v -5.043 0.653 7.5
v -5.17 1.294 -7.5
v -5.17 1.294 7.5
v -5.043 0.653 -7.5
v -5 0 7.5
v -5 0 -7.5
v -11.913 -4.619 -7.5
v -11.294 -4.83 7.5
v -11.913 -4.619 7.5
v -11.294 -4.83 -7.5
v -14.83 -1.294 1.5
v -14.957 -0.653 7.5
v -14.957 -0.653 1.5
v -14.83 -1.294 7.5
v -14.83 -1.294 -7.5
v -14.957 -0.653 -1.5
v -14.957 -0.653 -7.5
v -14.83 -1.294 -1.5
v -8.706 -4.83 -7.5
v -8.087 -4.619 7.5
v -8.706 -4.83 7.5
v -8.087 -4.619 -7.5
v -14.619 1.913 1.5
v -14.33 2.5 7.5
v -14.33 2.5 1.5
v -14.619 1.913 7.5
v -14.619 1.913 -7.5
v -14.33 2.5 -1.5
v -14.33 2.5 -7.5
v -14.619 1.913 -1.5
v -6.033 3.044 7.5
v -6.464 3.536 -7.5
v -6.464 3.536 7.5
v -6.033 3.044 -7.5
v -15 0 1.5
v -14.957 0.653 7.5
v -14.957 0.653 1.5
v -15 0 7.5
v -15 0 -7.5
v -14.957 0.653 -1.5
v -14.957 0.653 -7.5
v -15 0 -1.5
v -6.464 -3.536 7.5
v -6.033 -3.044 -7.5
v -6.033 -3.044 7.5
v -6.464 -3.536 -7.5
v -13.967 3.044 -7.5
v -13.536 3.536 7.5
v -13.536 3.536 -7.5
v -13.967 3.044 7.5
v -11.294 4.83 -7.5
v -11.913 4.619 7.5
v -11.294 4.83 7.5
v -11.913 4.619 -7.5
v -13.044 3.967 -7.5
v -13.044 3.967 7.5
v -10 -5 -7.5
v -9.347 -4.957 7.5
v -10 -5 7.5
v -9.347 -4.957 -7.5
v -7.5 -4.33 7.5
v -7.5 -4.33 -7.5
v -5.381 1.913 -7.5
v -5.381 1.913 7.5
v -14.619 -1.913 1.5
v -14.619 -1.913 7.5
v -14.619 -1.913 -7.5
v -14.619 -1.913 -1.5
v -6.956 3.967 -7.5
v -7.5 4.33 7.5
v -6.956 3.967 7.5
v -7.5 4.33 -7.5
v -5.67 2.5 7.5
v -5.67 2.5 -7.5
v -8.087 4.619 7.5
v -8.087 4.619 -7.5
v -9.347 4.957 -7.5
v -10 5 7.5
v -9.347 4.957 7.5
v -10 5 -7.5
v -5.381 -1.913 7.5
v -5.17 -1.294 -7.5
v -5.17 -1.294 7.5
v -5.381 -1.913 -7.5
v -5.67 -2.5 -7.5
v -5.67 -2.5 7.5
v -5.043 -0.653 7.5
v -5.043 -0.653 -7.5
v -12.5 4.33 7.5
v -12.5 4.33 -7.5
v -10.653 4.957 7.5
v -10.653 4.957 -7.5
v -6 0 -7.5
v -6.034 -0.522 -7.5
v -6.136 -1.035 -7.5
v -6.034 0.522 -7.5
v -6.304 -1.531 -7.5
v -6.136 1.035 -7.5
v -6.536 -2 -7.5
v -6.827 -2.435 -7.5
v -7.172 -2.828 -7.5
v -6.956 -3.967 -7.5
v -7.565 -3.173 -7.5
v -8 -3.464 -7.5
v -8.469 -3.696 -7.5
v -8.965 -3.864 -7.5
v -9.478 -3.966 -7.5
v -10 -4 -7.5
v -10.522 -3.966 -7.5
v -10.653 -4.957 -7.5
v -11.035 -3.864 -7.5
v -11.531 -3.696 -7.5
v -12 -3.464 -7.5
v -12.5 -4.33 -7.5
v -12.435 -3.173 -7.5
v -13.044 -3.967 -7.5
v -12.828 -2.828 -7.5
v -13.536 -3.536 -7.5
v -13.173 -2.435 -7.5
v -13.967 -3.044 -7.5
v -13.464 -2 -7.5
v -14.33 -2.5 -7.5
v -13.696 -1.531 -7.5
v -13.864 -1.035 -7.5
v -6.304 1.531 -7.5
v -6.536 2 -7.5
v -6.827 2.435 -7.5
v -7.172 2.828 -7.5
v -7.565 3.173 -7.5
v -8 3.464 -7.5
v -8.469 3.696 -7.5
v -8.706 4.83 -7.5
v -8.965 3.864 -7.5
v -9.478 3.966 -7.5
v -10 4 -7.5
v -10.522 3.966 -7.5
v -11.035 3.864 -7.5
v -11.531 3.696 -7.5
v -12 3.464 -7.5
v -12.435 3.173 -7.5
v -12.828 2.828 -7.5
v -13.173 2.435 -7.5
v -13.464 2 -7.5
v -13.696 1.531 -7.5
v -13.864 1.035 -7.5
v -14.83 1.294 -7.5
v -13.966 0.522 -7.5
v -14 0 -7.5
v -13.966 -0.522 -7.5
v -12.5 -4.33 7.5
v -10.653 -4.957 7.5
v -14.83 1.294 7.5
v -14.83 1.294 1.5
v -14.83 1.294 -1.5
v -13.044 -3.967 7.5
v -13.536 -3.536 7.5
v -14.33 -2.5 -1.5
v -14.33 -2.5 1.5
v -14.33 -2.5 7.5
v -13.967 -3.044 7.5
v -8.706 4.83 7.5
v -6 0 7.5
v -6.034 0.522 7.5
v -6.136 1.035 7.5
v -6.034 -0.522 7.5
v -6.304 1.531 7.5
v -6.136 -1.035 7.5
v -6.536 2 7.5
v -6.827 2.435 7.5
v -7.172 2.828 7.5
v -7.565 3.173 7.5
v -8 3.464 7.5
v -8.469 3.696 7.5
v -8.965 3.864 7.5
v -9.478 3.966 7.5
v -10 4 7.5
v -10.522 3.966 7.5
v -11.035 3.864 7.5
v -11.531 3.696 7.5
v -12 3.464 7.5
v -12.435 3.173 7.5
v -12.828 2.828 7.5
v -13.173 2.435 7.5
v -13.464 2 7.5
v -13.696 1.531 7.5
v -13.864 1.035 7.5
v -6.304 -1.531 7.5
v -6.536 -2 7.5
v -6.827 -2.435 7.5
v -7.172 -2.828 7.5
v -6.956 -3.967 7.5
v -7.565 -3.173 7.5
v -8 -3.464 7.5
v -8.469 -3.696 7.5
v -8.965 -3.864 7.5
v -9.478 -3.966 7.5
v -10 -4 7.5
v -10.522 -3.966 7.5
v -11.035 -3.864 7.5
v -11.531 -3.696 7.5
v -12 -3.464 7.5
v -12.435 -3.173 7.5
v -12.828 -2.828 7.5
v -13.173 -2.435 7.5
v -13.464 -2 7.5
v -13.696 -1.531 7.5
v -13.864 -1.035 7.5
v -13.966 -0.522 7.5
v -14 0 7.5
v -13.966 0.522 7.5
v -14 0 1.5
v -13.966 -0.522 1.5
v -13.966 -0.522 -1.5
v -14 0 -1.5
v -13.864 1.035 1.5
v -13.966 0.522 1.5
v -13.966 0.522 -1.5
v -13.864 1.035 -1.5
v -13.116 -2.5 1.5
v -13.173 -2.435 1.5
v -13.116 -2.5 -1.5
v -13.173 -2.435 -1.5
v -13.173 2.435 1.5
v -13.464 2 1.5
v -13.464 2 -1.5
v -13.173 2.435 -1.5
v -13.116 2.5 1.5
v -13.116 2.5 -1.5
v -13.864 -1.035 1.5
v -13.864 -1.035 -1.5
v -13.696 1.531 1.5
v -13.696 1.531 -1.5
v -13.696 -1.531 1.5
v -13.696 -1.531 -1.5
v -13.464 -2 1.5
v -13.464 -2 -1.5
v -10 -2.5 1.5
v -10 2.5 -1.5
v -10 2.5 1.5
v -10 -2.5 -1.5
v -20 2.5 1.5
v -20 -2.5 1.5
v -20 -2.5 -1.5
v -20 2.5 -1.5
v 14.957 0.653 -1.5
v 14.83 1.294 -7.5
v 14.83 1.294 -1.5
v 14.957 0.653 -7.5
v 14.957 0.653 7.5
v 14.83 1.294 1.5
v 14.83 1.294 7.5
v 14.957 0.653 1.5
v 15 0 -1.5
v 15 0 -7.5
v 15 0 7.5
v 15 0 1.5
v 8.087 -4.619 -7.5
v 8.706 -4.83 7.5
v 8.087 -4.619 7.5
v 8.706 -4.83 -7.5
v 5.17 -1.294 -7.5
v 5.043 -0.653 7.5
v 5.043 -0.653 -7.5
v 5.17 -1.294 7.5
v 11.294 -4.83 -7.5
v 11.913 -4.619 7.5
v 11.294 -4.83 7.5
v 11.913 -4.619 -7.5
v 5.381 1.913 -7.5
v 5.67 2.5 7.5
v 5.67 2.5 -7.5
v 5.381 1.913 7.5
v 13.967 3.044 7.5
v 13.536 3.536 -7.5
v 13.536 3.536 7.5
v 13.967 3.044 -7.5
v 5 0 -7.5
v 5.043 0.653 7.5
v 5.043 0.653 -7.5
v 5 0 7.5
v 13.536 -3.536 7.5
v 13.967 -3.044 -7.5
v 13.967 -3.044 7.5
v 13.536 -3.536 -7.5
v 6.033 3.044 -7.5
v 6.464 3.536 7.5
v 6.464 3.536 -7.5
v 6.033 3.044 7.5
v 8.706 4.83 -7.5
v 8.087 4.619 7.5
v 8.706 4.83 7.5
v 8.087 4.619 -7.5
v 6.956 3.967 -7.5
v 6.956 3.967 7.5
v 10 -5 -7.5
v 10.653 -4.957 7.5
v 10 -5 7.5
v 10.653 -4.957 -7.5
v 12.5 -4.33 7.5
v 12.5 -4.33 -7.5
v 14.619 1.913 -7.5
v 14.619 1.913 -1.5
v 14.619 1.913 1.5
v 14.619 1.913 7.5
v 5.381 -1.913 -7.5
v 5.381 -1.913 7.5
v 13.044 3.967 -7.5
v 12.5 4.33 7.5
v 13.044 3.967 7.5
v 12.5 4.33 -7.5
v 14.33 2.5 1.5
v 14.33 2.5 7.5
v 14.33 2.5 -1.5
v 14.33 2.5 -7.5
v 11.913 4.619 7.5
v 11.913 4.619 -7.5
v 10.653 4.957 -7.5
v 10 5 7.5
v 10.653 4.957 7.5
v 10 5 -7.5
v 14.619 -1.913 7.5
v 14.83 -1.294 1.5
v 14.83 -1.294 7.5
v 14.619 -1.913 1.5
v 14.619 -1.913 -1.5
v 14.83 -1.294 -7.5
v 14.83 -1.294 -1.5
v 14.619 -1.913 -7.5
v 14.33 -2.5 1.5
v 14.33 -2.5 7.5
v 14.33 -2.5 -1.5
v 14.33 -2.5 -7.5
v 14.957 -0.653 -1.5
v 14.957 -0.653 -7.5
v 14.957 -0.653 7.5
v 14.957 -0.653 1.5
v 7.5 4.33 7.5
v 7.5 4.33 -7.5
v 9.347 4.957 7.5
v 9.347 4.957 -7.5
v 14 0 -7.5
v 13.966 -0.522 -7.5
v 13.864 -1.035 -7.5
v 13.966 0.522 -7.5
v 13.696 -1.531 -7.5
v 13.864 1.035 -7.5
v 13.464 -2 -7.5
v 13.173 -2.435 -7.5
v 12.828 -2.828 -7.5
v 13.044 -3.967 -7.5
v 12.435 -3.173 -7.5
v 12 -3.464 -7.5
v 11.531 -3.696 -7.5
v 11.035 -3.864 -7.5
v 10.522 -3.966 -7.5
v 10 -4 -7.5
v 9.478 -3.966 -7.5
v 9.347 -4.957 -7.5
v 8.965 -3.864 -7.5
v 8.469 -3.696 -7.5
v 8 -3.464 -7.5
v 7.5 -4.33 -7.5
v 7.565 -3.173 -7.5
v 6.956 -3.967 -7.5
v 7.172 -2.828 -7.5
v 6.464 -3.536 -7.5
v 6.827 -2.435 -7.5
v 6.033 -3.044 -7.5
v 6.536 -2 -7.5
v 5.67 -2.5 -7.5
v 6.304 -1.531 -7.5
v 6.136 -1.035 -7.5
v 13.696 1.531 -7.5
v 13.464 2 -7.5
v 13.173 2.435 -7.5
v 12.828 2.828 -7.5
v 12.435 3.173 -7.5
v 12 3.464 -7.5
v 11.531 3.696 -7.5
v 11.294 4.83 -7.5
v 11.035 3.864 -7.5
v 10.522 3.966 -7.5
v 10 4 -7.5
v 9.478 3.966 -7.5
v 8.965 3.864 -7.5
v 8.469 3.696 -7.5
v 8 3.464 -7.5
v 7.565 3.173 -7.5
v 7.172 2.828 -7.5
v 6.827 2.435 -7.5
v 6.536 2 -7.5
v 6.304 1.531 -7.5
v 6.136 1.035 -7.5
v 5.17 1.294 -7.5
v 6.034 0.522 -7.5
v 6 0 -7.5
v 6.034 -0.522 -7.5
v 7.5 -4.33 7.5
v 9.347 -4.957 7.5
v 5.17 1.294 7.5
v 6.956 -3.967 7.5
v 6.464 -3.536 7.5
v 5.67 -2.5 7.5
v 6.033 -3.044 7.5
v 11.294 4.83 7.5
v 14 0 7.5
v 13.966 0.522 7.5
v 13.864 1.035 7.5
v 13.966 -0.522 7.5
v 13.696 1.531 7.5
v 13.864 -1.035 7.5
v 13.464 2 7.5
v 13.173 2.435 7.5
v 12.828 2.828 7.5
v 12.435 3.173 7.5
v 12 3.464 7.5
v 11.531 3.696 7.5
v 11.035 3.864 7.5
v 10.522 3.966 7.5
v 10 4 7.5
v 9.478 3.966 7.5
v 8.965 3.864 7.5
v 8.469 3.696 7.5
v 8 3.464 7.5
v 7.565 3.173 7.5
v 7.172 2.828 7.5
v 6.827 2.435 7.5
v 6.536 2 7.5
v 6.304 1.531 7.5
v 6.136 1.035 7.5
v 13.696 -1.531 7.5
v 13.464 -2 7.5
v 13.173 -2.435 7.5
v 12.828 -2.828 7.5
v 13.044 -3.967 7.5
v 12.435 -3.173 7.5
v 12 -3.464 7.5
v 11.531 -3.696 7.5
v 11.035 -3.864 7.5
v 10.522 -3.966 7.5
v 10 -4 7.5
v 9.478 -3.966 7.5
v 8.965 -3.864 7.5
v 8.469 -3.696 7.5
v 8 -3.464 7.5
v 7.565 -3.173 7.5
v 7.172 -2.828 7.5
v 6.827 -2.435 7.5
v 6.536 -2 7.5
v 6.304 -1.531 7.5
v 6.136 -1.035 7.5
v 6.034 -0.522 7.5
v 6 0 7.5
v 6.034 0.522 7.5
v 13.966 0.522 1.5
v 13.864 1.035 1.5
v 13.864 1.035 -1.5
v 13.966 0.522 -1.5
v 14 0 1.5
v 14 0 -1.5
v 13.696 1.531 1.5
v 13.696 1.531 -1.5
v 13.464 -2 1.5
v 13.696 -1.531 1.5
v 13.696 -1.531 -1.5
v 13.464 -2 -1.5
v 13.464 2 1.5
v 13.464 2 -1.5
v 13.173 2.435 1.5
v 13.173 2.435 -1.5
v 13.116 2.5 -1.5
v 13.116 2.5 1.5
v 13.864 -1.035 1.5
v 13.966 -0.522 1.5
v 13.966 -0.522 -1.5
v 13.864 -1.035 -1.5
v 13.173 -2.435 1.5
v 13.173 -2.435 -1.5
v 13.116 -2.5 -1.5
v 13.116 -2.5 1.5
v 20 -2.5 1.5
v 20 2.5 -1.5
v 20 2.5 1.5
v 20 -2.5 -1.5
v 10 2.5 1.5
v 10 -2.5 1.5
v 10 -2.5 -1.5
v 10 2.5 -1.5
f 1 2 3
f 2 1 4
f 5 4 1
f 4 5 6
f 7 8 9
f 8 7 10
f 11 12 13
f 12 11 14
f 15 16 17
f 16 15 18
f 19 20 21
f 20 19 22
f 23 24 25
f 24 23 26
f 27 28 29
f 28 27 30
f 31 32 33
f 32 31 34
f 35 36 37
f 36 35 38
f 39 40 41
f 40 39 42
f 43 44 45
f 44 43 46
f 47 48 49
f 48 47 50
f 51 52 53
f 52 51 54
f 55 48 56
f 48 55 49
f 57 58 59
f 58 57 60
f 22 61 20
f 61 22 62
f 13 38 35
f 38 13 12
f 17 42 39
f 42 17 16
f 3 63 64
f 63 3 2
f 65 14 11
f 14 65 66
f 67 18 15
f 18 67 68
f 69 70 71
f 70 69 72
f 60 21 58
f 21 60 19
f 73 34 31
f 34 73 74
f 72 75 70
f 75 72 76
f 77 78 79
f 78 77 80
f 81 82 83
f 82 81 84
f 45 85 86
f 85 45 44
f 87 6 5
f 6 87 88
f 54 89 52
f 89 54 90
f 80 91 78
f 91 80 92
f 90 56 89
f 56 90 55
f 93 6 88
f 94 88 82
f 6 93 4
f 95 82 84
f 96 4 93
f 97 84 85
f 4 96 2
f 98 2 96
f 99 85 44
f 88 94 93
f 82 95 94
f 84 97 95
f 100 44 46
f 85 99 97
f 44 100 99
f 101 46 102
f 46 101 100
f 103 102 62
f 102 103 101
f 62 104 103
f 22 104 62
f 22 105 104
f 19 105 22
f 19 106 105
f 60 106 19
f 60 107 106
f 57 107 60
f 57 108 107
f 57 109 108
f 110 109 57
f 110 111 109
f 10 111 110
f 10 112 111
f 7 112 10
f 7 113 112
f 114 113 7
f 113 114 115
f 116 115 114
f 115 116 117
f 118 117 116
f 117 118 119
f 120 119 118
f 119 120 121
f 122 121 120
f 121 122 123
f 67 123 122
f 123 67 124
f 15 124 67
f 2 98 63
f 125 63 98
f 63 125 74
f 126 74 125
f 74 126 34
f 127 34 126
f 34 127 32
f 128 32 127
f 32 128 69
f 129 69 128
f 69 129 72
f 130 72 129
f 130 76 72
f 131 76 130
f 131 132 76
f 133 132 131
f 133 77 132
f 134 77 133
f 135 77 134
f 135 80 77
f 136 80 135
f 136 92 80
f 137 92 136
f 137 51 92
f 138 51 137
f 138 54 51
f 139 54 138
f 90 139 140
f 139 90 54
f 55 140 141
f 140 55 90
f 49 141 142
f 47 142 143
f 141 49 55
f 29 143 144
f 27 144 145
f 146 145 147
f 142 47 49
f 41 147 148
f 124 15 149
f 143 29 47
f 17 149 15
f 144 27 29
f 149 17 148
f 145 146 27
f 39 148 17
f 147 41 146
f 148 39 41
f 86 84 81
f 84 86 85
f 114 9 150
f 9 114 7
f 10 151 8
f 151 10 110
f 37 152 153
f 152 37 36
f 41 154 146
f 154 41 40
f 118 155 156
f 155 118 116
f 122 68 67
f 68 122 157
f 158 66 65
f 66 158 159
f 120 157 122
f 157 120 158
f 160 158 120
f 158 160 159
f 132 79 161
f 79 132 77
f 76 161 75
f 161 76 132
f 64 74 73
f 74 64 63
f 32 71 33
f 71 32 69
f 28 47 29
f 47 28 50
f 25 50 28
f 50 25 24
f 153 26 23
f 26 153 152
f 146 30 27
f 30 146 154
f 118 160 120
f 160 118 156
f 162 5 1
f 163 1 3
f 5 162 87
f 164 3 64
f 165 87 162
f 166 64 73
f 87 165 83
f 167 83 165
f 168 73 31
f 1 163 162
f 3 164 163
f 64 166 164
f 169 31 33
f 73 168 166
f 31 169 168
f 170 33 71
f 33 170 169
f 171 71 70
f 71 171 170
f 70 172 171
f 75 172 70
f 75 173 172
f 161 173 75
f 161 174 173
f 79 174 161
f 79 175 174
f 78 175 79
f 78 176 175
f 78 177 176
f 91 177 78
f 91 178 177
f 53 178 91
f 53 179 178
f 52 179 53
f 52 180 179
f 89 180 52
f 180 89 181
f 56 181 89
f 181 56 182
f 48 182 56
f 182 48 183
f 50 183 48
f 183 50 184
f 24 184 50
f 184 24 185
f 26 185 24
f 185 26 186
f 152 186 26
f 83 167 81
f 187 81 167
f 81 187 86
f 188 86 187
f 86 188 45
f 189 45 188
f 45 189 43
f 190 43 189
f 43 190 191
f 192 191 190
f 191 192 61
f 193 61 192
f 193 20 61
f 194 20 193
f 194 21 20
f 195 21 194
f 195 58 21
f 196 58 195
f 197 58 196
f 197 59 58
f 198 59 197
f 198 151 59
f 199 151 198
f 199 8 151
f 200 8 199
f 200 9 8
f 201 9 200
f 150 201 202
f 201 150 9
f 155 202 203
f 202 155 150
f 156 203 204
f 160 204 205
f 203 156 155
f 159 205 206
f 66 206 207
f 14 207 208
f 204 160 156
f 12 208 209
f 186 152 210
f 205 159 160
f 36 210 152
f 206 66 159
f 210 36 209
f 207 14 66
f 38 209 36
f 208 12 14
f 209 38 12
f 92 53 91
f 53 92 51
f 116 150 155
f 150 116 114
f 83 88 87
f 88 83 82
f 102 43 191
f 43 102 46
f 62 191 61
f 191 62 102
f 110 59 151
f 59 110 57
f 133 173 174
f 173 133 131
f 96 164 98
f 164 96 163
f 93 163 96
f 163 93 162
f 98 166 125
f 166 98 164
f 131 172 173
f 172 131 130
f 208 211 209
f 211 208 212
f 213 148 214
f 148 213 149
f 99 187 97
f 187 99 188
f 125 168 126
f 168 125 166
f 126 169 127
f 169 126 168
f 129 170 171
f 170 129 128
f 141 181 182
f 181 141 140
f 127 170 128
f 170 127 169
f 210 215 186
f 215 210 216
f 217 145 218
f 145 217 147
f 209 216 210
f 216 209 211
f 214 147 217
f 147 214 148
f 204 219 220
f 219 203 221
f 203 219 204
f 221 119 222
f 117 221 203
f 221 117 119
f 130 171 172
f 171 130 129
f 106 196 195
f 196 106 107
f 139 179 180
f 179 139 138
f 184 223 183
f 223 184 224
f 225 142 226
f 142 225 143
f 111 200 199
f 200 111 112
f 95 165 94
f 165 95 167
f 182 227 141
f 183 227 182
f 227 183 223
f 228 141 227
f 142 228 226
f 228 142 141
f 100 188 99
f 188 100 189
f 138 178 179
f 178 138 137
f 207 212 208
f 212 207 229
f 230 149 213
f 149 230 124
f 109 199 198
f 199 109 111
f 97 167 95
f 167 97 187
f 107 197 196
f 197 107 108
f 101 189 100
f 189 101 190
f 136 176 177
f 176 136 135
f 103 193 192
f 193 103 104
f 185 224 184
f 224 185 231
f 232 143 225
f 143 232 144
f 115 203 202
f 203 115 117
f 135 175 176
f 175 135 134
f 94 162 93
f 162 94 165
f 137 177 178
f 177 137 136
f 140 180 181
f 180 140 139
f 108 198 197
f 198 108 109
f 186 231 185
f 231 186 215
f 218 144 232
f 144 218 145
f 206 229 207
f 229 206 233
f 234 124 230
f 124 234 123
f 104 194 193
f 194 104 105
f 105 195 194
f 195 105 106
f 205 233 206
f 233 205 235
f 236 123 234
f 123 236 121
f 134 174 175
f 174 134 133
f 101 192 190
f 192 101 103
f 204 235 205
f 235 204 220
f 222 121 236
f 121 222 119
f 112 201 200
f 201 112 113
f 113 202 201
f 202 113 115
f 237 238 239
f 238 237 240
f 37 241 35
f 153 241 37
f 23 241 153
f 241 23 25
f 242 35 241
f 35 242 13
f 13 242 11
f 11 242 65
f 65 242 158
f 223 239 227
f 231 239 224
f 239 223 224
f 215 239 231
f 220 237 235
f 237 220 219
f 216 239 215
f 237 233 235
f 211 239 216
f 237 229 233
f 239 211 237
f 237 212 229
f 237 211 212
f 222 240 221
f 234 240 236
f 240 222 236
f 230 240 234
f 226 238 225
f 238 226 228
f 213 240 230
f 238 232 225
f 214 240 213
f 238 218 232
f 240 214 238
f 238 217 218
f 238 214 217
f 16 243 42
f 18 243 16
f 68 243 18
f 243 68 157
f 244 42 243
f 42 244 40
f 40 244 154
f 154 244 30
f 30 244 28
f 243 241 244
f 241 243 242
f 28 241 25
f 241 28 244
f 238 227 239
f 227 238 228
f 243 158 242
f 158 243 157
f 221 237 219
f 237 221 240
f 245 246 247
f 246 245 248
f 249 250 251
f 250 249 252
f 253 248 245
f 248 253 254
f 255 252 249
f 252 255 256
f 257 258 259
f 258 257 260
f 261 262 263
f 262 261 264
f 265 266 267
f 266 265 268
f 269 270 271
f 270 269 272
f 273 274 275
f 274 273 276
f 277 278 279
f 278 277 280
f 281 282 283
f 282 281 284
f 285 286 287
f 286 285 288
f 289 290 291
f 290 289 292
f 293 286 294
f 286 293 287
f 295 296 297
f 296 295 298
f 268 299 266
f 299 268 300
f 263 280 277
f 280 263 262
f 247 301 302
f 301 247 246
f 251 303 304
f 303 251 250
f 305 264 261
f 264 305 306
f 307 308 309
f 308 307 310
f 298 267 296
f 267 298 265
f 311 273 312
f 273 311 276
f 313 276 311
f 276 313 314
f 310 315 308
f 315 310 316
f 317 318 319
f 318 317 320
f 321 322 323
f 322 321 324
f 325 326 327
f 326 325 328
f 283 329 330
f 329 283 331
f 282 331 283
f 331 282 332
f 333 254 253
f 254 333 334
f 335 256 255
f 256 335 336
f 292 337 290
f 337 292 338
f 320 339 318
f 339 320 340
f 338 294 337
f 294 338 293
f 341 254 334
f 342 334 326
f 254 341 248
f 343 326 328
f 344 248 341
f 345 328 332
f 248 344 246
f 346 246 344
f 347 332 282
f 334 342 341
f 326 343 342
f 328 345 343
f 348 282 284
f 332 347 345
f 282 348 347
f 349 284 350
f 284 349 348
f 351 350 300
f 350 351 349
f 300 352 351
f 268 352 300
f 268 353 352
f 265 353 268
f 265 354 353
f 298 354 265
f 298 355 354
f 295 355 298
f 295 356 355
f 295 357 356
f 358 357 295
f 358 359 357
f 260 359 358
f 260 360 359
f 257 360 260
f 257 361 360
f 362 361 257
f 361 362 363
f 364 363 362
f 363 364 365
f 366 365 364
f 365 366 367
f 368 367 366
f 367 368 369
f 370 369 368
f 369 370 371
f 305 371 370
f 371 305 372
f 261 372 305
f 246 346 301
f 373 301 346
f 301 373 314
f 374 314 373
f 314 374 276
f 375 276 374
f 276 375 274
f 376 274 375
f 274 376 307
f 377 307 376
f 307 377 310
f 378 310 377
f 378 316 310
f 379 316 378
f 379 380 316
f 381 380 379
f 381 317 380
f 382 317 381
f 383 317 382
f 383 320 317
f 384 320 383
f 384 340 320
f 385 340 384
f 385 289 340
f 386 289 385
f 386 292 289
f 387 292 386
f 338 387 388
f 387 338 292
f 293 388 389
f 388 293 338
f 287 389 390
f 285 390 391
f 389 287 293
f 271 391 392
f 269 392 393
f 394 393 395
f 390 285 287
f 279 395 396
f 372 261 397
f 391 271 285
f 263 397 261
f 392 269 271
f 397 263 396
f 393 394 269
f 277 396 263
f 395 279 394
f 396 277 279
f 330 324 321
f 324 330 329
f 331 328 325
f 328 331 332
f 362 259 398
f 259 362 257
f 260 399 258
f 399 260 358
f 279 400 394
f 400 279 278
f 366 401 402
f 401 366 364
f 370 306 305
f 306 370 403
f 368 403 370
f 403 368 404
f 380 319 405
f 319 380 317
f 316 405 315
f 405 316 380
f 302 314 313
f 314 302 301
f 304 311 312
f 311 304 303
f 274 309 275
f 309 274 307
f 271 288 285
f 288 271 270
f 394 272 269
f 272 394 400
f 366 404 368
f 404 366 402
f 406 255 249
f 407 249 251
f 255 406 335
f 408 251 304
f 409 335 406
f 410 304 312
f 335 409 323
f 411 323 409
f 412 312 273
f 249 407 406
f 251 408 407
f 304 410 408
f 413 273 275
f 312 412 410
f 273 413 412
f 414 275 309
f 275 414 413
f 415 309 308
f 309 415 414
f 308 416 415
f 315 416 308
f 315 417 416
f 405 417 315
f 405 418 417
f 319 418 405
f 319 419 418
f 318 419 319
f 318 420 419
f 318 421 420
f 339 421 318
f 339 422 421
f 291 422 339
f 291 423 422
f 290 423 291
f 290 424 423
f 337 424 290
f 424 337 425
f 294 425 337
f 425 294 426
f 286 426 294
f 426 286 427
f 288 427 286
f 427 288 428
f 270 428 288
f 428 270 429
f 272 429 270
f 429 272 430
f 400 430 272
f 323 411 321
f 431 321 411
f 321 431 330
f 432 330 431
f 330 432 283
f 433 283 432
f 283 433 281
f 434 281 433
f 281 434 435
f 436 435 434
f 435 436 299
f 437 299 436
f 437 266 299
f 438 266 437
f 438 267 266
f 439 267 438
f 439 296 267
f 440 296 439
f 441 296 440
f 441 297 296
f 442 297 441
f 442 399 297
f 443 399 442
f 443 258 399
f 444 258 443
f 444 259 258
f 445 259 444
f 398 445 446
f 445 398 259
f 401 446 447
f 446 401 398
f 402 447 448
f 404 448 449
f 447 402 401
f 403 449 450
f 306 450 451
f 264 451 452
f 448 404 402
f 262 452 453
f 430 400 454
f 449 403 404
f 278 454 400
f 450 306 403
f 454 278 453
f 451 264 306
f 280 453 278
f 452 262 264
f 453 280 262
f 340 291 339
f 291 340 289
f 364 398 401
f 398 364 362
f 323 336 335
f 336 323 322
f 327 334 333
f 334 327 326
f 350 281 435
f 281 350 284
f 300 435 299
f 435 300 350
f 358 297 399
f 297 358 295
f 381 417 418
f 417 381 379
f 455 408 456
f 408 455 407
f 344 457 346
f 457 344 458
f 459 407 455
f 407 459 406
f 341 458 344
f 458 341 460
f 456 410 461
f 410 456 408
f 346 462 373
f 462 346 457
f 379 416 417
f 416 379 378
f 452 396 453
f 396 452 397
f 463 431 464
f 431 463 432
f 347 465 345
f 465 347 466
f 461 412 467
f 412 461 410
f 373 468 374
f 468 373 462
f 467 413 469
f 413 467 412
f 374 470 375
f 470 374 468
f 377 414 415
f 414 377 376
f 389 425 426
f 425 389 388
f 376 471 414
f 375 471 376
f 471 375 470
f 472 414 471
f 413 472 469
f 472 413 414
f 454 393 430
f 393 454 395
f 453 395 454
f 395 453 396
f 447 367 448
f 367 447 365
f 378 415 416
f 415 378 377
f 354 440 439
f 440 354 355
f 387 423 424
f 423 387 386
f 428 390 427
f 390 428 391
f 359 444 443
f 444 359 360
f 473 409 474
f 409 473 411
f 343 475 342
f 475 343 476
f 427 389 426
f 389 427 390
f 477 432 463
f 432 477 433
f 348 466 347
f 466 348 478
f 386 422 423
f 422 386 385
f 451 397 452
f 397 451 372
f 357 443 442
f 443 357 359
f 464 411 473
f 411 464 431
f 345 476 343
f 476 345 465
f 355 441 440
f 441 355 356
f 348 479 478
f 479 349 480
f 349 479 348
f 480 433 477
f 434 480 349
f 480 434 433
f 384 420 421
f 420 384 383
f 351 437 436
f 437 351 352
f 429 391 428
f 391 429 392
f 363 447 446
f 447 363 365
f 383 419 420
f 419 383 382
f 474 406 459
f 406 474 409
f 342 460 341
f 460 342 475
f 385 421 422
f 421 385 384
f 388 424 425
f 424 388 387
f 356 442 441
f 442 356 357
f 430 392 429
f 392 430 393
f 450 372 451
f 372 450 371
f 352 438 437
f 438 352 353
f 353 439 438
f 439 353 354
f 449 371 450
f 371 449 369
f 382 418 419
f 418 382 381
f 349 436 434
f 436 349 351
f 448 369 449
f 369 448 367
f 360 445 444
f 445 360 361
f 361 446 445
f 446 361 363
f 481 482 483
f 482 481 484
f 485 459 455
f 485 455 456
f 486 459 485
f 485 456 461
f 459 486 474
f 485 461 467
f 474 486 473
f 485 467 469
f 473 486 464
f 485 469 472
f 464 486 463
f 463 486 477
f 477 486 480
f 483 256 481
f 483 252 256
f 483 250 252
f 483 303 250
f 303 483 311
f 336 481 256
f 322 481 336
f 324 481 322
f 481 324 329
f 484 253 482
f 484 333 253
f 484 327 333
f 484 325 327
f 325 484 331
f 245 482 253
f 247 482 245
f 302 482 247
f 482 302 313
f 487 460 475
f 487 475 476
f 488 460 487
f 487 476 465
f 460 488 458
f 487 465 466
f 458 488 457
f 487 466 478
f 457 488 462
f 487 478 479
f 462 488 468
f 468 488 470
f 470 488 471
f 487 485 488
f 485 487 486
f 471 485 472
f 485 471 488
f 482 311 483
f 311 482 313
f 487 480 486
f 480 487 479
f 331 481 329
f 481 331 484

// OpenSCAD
// Generated by SolidPython 0.4.5 on 2019-12-22 19:00:25
$fn = 48;

union() {
	union() {
		translate(v = [-15, 0, 0]) {
			cube(center = true, size = [10, 5, 3]);
		}
		translate(v = [-10, 0, 0]) {
			difference() {
				cylinder(center = true, h = 15, r = 5);
				cylinder(center = true, h = 16, r = 4);
			}
		}
	}
	union() {
		translate(v = [15, 0, 0]) {
			cube(center = true, size = [10, 5, 3]);
		}
		translate(v = [10, 0, 0]) {
			difference() {
				cylinder(center = true, h = 15, r = 5);
				cylinder(center = true, h = 16, r = 4);
			}
		}
	}
}
/***********************************************
*********      SolidPython code:      **********
************************************************
 
#! /usr/bin/env python3
import sys

from solid import scad_render_to_file
from solid.objects import cube, cylinder, difference, translate, union
from solid.utils import right

SEGMENTS = 48


def basic_geometry():
    # SolidPython code can look a lot like OpenSCAD code.  It also has
    # some syntactic sugar built in that can make it look more pythonic.
    # Here are two identical pieces of geometry, one left and one right.

    # left_piece uses standard OpenSCAD grammar (note the commas between
    # block elements; OpenSCAD doesn't require this)
    left_piece = union()(
            translate((-15, 0, 0))(
                    cube([10, 5, 3], center=True)
            ),
            translate((-10, 0, 0))(
                    difference()(
                            cylinder(r=5, h=15, center=True),
                            cylinder(r=4, h=16, center=True)
                    )
            )
    )

    # Right piece uses a more Pythonic grammar.  + (plus) is equivalent to union(), 
    # - (minus) is equivalent to difference() and * (star) is equivalent to intersection
    # solid.utils also defines up(), down(), left(), right(), forward(), and back()
    # for common transforms.
    right_piece = right(15)(cube([10, 5, 3], center=True))
    cyl = cylinder(r=5, h=15, center=True) - cylinder(r=4, h=16, center=True)
    right_piece += right(10)(cyl)

    return union()(left_piece, right_piece)


if __name__ == '__main__':
    out_dir = sys.argv[1] if len(sys.argv) > 1 else None

    a = basic_geometry()

    # Adding the file_header argument as shown allows you to change
    # the detail of arcs by changing the SEGMENTS variable.  This can
    # be expensive when making lots of small curves, but is otherwise
    # useful.
    file_out = scad_render_to_file(a, out_dir=out_dir, file_header=f'$fn = {SEGMENTS};')
    print(f"{__file__}: SCAD file written to: \n{file_out}")
 
 
************************************************/
